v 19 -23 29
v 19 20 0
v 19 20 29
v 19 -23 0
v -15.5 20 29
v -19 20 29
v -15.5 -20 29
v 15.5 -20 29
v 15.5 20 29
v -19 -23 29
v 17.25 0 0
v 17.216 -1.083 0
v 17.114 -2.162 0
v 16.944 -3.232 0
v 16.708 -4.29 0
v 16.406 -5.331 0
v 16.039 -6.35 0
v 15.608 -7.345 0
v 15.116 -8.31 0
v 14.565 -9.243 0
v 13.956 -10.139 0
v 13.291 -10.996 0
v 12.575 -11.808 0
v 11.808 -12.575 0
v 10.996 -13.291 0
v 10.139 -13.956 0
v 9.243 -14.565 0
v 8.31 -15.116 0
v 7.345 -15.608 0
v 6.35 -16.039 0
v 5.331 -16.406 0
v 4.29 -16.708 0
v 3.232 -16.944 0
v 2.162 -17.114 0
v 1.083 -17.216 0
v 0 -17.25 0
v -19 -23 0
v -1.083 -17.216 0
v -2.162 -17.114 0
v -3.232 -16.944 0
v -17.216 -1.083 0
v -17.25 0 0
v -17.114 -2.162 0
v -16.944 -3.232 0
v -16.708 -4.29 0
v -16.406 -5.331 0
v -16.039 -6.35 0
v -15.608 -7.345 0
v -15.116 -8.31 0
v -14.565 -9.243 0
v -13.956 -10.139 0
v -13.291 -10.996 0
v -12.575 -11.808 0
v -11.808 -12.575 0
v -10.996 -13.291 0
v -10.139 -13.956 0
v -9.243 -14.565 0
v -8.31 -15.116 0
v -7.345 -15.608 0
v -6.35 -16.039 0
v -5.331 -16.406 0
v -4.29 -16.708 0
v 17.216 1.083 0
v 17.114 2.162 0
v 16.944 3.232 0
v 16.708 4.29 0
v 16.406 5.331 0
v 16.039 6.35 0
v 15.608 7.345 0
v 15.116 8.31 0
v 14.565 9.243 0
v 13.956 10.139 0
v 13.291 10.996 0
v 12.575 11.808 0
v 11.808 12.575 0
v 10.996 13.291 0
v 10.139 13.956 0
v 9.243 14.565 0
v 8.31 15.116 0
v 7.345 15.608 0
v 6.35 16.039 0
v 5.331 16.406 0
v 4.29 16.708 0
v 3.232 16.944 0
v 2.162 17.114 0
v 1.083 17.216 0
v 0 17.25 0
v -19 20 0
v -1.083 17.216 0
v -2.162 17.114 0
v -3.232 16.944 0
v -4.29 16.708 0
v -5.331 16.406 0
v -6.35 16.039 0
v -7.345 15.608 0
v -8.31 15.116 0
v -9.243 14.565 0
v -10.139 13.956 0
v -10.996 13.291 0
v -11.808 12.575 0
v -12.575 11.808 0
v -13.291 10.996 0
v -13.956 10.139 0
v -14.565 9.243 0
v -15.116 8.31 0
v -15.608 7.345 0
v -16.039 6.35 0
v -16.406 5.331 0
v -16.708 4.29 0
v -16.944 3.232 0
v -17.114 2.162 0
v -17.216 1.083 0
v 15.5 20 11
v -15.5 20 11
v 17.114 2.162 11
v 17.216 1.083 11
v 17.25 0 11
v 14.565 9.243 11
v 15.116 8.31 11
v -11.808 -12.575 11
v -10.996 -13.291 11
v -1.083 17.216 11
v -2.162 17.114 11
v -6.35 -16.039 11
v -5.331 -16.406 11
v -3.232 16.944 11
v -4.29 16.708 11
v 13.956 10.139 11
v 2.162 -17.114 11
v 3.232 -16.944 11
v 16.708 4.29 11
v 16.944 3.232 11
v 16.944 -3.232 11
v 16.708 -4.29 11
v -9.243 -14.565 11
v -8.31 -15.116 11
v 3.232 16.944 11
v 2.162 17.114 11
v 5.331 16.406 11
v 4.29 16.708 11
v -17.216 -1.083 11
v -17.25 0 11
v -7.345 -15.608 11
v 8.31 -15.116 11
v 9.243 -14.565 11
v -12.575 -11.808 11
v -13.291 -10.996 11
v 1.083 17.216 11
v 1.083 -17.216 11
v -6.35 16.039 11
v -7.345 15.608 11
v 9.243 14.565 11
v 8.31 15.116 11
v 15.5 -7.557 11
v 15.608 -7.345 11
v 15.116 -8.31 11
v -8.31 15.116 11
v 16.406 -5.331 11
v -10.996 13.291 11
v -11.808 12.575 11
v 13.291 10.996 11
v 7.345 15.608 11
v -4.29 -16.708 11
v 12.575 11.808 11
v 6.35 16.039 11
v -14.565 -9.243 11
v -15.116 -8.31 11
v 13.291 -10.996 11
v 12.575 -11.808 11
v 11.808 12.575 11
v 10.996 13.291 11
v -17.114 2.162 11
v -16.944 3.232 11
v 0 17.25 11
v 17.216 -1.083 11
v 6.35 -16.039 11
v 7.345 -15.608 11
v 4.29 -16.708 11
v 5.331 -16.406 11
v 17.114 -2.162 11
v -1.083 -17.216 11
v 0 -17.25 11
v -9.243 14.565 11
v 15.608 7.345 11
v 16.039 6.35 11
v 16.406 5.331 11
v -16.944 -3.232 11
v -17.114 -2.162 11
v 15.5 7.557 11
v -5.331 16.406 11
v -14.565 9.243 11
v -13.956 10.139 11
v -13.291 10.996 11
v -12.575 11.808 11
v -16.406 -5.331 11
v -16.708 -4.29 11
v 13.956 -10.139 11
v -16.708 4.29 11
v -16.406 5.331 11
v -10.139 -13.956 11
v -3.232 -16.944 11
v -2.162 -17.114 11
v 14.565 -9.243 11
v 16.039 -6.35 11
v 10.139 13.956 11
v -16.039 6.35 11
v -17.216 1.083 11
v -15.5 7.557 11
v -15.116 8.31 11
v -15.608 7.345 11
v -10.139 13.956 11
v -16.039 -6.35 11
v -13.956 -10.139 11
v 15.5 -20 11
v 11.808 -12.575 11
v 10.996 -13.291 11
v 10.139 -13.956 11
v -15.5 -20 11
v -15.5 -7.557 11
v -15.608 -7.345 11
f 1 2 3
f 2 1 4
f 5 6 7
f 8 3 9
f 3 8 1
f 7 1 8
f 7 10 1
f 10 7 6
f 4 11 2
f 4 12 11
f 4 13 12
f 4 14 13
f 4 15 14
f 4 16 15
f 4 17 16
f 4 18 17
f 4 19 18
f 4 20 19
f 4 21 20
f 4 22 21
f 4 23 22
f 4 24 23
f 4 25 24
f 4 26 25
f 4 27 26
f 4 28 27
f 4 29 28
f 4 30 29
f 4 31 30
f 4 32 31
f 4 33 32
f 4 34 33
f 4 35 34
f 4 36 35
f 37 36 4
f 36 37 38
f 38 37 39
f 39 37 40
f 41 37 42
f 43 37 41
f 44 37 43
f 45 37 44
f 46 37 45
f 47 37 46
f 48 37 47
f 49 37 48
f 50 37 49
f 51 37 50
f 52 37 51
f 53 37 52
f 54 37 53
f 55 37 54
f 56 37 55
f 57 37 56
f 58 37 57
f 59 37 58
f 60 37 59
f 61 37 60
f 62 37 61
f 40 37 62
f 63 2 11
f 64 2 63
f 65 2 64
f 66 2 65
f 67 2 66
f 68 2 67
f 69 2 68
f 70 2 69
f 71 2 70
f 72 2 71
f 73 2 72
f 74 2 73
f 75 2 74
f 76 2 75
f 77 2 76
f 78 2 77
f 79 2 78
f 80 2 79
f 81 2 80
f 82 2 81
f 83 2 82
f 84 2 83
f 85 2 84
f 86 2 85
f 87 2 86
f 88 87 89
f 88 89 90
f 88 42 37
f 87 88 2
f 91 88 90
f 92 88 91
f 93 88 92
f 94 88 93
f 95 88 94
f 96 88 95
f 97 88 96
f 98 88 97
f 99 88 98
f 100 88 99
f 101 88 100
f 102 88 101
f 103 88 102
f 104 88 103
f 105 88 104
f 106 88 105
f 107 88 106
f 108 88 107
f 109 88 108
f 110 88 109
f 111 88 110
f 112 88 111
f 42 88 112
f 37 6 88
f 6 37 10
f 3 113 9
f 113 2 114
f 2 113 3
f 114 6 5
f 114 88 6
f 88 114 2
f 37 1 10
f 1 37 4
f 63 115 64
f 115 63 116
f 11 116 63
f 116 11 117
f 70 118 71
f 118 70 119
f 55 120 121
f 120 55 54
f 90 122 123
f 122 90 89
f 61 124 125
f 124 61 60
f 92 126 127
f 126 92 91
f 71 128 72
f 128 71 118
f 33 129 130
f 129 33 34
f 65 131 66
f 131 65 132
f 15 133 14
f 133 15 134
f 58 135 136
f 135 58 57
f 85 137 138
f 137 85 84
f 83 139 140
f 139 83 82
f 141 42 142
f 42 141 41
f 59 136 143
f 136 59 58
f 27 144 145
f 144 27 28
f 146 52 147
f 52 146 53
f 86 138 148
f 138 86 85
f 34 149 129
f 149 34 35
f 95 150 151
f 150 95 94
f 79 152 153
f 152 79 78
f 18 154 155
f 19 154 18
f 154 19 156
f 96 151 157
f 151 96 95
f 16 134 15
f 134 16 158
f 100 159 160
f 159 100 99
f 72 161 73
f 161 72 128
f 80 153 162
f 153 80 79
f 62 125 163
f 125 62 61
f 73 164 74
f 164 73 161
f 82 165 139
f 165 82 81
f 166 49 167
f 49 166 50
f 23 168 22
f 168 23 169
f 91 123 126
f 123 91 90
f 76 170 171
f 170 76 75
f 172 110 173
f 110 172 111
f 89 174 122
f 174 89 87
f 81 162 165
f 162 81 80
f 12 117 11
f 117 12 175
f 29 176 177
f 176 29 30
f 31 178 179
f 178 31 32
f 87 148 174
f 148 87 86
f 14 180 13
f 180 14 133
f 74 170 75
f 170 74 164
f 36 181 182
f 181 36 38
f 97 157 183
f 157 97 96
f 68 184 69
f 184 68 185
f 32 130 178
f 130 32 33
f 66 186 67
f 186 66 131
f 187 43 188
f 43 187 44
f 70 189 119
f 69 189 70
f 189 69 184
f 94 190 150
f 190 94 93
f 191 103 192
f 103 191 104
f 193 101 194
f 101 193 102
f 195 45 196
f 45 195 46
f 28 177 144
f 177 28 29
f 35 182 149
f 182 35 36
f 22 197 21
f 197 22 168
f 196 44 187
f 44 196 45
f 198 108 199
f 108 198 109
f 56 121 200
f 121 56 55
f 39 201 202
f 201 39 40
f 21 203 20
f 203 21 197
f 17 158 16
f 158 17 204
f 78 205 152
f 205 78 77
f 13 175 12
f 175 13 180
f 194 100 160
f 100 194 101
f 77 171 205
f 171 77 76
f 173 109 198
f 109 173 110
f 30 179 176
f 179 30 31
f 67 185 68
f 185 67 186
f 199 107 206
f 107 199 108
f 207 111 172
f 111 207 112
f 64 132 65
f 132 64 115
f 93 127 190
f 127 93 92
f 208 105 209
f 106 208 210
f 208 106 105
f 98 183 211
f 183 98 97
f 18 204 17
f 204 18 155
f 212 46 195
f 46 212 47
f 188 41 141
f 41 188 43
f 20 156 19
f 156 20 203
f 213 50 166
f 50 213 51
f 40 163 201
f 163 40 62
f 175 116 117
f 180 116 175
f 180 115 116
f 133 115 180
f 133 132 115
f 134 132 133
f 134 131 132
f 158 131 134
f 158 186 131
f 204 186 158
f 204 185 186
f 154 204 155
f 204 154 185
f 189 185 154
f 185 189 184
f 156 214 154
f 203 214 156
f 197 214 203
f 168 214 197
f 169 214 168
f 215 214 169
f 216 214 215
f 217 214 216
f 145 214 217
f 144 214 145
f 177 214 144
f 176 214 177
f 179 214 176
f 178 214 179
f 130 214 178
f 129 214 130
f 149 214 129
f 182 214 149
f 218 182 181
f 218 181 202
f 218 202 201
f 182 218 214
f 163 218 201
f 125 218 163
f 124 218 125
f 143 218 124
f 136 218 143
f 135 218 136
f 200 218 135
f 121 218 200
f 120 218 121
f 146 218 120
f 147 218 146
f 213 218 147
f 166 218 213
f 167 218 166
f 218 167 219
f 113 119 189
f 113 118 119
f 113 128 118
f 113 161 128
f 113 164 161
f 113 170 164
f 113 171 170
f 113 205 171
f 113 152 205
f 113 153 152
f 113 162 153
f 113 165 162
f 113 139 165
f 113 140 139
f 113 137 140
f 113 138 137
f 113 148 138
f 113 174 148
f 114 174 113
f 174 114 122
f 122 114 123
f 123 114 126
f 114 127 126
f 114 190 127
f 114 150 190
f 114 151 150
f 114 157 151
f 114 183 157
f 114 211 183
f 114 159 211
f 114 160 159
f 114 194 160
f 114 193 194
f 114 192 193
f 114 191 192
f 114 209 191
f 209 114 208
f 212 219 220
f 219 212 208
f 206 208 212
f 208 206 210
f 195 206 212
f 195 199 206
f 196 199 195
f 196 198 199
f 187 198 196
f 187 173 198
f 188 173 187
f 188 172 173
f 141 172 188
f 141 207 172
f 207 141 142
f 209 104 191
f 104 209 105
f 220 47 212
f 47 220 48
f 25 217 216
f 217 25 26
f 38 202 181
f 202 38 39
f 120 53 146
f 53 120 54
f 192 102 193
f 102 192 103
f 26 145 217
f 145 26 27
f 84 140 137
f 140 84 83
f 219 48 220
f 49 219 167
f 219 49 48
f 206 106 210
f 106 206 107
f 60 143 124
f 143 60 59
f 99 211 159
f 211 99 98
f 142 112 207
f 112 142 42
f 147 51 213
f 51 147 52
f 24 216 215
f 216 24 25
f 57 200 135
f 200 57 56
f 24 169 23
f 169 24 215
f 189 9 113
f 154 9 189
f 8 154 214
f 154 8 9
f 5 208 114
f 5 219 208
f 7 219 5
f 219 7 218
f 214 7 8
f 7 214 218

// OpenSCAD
$fn = 100;

difference() {
    translate([-19,-23,0]){
        cube([38, 43, 29]);
    }
    cylinder(d=34.5, h=11);

    translate([-15.5,-20,11]){
        cube([31, 40, 18]);
    }
}
